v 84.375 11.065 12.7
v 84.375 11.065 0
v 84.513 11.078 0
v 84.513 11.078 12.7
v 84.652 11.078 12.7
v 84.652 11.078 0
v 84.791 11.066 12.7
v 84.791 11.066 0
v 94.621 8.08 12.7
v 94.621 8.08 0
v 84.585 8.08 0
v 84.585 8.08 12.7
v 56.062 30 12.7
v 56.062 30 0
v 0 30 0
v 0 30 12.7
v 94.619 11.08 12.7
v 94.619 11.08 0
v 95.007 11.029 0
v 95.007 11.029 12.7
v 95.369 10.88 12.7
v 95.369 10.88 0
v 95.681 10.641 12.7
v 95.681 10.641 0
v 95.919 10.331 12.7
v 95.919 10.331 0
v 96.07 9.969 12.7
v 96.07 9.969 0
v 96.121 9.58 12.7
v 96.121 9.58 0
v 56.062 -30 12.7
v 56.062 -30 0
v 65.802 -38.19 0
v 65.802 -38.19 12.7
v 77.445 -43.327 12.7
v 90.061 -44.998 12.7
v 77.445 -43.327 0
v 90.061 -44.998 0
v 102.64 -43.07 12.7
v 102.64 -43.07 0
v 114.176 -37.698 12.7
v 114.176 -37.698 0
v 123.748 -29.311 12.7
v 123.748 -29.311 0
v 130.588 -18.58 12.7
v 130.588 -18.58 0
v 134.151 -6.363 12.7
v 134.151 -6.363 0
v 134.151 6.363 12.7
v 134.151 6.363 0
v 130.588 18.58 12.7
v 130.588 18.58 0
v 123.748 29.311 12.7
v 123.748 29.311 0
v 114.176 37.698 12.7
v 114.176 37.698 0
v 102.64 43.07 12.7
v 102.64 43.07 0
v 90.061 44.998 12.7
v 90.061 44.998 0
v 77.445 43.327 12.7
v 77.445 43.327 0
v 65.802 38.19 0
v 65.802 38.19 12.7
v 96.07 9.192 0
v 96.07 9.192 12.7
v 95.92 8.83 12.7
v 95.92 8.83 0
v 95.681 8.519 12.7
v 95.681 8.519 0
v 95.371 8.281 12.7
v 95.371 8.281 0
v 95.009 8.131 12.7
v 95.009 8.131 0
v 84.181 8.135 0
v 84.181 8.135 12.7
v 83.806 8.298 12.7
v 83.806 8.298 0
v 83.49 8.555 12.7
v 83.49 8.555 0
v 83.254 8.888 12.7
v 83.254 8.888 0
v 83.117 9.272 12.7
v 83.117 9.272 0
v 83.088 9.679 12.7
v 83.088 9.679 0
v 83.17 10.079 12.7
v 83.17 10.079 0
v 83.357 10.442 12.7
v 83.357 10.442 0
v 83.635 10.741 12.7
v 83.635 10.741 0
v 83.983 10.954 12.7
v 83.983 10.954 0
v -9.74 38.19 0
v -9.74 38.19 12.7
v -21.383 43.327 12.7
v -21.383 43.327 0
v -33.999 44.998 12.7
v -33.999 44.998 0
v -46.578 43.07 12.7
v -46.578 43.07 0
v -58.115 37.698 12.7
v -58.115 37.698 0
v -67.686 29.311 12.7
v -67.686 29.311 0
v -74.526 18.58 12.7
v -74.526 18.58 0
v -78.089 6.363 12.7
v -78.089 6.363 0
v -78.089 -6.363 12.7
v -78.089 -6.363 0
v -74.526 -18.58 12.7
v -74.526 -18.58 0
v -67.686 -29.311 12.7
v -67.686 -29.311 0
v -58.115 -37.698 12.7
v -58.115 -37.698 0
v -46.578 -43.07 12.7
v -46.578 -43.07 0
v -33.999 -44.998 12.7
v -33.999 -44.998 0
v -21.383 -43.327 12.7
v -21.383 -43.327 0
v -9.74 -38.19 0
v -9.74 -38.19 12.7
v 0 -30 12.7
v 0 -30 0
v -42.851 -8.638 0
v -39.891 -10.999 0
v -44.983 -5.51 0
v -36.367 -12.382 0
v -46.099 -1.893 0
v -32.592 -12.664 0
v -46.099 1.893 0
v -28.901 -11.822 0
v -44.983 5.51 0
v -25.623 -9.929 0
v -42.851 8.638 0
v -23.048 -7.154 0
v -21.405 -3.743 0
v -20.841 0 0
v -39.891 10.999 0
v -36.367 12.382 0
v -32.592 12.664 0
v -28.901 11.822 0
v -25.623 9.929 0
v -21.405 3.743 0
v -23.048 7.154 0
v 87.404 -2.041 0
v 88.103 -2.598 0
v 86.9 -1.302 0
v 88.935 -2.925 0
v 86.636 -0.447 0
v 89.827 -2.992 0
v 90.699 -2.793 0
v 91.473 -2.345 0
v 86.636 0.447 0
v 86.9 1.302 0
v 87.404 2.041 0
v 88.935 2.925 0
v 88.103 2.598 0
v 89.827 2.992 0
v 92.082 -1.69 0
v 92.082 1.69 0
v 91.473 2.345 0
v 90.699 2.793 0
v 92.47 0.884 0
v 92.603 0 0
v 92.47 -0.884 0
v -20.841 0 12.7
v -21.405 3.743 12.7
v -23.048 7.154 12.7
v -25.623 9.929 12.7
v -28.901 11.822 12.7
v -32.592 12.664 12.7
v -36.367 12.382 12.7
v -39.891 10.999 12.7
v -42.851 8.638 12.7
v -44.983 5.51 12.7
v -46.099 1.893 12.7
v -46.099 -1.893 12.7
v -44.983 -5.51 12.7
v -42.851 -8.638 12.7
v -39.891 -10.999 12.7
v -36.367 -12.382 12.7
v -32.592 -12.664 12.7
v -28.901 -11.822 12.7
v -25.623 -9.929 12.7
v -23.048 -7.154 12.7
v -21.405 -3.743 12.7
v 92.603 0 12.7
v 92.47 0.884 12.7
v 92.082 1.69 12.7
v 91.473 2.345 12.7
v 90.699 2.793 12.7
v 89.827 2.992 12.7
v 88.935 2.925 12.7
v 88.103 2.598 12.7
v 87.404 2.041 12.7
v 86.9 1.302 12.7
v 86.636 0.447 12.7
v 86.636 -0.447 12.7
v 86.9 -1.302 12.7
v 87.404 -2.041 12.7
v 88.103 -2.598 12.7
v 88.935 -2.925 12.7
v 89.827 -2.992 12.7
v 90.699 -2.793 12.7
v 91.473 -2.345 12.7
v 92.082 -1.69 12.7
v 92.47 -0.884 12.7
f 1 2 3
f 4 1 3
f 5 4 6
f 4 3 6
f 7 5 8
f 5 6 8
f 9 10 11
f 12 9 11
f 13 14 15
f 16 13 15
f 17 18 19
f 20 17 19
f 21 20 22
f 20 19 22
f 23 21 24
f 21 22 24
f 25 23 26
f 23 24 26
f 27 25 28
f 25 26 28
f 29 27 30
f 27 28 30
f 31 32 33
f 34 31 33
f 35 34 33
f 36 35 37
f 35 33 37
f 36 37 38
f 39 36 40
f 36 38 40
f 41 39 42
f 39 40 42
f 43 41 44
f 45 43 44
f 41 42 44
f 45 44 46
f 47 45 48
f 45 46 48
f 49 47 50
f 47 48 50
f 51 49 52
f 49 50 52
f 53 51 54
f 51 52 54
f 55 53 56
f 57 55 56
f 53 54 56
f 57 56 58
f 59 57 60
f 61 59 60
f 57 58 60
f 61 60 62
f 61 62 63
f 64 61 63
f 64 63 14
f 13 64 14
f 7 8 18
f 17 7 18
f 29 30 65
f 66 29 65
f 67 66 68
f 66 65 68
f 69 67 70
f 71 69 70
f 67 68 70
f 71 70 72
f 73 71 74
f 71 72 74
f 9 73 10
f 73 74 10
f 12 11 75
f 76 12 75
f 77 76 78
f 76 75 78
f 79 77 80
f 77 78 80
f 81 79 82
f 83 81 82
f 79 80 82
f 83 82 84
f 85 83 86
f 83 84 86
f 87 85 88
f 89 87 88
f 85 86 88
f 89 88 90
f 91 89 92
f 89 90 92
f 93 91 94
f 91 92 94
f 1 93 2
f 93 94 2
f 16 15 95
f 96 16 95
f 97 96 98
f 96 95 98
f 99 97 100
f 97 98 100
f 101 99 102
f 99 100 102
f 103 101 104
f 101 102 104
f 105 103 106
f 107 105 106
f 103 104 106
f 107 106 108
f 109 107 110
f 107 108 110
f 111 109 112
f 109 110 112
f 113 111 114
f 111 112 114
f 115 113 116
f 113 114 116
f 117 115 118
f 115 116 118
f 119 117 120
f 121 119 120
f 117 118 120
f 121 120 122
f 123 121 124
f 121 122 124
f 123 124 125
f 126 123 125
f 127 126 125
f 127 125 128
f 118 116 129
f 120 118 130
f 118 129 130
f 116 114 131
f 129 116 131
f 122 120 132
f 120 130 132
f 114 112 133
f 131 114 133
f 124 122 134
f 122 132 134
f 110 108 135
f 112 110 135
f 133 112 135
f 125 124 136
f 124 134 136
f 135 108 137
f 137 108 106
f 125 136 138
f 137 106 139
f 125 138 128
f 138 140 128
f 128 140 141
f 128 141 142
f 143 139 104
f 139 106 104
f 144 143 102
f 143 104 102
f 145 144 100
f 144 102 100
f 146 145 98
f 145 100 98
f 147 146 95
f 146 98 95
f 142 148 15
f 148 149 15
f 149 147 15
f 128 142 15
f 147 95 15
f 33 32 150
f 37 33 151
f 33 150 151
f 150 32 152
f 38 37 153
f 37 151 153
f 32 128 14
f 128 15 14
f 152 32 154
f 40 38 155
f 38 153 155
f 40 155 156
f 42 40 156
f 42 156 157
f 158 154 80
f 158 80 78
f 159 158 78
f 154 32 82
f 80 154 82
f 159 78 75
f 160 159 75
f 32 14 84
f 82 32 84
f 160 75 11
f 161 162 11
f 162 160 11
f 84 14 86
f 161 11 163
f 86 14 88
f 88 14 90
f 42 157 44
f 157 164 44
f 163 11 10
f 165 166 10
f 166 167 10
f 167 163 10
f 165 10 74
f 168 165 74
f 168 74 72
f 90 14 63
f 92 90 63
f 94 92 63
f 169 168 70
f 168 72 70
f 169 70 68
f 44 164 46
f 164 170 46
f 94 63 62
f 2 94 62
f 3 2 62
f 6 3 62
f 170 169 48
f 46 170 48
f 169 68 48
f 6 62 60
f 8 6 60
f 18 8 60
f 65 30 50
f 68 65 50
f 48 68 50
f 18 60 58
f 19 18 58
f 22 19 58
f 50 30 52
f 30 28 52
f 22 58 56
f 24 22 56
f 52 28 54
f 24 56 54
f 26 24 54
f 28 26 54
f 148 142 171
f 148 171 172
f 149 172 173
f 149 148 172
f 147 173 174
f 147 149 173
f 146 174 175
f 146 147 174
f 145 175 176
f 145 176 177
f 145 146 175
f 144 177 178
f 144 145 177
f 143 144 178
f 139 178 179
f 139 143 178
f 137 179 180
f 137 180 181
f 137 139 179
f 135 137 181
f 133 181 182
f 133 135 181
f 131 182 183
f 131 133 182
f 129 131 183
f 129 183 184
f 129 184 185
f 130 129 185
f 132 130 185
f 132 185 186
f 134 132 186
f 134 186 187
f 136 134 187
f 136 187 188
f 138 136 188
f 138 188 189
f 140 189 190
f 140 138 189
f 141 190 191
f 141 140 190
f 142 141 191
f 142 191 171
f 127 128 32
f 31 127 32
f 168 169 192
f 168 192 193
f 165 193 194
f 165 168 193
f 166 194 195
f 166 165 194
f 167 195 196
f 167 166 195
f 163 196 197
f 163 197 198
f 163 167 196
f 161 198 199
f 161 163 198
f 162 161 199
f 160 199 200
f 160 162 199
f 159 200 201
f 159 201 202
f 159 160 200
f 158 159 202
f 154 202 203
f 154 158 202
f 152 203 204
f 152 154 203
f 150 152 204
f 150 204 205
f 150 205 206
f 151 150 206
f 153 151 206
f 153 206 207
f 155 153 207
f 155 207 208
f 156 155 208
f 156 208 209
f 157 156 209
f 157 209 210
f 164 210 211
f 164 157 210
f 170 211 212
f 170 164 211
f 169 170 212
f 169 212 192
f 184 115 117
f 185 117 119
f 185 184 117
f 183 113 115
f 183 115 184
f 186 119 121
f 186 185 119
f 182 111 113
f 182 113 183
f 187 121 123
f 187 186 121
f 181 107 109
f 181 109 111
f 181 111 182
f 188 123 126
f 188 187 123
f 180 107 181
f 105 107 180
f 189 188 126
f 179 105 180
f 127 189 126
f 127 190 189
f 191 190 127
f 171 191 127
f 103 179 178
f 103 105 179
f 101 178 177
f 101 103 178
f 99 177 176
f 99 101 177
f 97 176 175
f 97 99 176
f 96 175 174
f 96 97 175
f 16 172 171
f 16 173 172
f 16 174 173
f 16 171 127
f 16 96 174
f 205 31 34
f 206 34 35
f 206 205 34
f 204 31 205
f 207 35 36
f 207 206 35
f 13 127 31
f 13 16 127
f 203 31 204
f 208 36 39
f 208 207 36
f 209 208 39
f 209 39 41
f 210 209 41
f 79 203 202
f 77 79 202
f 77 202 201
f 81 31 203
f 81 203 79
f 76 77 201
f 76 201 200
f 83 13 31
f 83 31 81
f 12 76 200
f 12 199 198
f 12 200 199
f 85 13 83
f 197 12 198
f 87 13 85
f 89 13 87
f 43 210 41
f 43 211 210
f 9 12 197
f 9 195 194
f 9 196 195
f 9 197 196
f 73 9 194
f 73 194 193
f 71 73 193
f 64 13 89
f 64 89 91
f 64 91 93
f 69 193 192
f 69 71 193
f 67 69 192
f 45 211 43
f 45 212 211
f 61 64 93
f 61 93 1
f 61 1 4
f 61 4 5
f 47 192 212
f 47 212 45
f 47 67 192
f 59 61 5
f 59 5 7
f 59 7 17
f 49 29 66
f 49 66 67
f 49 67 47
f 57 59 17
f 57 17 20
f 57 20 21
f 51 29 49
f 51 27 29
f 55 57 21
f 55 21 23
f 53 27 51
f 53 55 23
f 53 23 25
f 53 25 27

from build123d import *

# Parameters (mm, degrees)
F0_R     = 3
F0_R_2   = 12.7
F1_DEPTH = 12.7


# Not quite as in the source:
# - a feature names something its author has since deleted; it is built from what else it names


with BuildPart() as f1:
    # F0 (on Top) → F1 (new body)
    with BuildSketch(Plane.XY):
        with BuildLine():
            ThreePointArc((56.0618189529, -29.9999992666), (105.6598328516, -42.0377563289), (134.6028392714, 0))
            ThreePointArc((134.6028392714, 0), (105.6598328516, 42.0377563289), (56.0618189529, 29.9999992666))
            ThreePointArc((56.0618189529, 29.9999992666), (44.6028392714, 0), (56.0618189529, -29.9999992666))
        make_face()
        with Locations((89.6028392714, 0)):
            Circle(F0_R, mode=Mode.SUBTRACT)
        with BuildLine():
            ThreePointArc((84.5849392714, 8.08), (83.0886369502, 9.4747414442), (84.3749411096, 11.0652275152))
            ThreePointArc((84.3749411096, 11.0652275152), (84.5827763317, 11.0799984406), (84.7906532876, 11.0658269561))
            Line((84.7906532876, 11.0658269561), (94.6185763317, 11.0799984406))
            ThreePointArc((94.6185763317, 11.0799984406), (95.6806344526, 10.641424611), (96.1207392714, 9.58))
            ThreePointArc((96.1207392714, 9.58), (95.6813994432, 8.5193398282), (94.6207392714, 8.08))
            Line((94.6207392714, 8.08), (84.5849392714, 8.08))
        make_face(mode=Mode.SUBTRACT)
        with BuildLine():
            ThreePointArc((56.0618189529, -29.9999992666), (44.6028392714, 0), (56.0618189529, 29.9999992666))
            Line((56.0618189529, 29.9999992666), (0, 29.9999992666))
            ThreePointArc((0, 29.9999992666), (8.4967360104, 16.0569935802), (11.4589796815, 0))
            ThreePointArc((11.4589796815, 0), (8.4967360104, -16.0569935802), (0, -29.9999992666))
            Line((0, -29.9999992666), (56.0618189529, -29.9999992666))
        make_face()
        with BuildLine():
            ThreePointArc((11.4589796815, 0), (8.4967360104, 16.0569935802), (0, 29.9999992666))
            ThreePointArc((0, 29.9999992666), (-78.5410203185, 0), (0, -29.9999992666))
            ThreePointArc((0, -29.9999992666), (8.4967360104, -16.0569935802), (11.4589796815, 0))
        make_face()
        with Locations((-33.5410203185, 0)):
            Circle(F0_R_2, mode=Mode.SUBTRACT)
    extrude(amount=F1_DEPTH)


solid = f1.part
